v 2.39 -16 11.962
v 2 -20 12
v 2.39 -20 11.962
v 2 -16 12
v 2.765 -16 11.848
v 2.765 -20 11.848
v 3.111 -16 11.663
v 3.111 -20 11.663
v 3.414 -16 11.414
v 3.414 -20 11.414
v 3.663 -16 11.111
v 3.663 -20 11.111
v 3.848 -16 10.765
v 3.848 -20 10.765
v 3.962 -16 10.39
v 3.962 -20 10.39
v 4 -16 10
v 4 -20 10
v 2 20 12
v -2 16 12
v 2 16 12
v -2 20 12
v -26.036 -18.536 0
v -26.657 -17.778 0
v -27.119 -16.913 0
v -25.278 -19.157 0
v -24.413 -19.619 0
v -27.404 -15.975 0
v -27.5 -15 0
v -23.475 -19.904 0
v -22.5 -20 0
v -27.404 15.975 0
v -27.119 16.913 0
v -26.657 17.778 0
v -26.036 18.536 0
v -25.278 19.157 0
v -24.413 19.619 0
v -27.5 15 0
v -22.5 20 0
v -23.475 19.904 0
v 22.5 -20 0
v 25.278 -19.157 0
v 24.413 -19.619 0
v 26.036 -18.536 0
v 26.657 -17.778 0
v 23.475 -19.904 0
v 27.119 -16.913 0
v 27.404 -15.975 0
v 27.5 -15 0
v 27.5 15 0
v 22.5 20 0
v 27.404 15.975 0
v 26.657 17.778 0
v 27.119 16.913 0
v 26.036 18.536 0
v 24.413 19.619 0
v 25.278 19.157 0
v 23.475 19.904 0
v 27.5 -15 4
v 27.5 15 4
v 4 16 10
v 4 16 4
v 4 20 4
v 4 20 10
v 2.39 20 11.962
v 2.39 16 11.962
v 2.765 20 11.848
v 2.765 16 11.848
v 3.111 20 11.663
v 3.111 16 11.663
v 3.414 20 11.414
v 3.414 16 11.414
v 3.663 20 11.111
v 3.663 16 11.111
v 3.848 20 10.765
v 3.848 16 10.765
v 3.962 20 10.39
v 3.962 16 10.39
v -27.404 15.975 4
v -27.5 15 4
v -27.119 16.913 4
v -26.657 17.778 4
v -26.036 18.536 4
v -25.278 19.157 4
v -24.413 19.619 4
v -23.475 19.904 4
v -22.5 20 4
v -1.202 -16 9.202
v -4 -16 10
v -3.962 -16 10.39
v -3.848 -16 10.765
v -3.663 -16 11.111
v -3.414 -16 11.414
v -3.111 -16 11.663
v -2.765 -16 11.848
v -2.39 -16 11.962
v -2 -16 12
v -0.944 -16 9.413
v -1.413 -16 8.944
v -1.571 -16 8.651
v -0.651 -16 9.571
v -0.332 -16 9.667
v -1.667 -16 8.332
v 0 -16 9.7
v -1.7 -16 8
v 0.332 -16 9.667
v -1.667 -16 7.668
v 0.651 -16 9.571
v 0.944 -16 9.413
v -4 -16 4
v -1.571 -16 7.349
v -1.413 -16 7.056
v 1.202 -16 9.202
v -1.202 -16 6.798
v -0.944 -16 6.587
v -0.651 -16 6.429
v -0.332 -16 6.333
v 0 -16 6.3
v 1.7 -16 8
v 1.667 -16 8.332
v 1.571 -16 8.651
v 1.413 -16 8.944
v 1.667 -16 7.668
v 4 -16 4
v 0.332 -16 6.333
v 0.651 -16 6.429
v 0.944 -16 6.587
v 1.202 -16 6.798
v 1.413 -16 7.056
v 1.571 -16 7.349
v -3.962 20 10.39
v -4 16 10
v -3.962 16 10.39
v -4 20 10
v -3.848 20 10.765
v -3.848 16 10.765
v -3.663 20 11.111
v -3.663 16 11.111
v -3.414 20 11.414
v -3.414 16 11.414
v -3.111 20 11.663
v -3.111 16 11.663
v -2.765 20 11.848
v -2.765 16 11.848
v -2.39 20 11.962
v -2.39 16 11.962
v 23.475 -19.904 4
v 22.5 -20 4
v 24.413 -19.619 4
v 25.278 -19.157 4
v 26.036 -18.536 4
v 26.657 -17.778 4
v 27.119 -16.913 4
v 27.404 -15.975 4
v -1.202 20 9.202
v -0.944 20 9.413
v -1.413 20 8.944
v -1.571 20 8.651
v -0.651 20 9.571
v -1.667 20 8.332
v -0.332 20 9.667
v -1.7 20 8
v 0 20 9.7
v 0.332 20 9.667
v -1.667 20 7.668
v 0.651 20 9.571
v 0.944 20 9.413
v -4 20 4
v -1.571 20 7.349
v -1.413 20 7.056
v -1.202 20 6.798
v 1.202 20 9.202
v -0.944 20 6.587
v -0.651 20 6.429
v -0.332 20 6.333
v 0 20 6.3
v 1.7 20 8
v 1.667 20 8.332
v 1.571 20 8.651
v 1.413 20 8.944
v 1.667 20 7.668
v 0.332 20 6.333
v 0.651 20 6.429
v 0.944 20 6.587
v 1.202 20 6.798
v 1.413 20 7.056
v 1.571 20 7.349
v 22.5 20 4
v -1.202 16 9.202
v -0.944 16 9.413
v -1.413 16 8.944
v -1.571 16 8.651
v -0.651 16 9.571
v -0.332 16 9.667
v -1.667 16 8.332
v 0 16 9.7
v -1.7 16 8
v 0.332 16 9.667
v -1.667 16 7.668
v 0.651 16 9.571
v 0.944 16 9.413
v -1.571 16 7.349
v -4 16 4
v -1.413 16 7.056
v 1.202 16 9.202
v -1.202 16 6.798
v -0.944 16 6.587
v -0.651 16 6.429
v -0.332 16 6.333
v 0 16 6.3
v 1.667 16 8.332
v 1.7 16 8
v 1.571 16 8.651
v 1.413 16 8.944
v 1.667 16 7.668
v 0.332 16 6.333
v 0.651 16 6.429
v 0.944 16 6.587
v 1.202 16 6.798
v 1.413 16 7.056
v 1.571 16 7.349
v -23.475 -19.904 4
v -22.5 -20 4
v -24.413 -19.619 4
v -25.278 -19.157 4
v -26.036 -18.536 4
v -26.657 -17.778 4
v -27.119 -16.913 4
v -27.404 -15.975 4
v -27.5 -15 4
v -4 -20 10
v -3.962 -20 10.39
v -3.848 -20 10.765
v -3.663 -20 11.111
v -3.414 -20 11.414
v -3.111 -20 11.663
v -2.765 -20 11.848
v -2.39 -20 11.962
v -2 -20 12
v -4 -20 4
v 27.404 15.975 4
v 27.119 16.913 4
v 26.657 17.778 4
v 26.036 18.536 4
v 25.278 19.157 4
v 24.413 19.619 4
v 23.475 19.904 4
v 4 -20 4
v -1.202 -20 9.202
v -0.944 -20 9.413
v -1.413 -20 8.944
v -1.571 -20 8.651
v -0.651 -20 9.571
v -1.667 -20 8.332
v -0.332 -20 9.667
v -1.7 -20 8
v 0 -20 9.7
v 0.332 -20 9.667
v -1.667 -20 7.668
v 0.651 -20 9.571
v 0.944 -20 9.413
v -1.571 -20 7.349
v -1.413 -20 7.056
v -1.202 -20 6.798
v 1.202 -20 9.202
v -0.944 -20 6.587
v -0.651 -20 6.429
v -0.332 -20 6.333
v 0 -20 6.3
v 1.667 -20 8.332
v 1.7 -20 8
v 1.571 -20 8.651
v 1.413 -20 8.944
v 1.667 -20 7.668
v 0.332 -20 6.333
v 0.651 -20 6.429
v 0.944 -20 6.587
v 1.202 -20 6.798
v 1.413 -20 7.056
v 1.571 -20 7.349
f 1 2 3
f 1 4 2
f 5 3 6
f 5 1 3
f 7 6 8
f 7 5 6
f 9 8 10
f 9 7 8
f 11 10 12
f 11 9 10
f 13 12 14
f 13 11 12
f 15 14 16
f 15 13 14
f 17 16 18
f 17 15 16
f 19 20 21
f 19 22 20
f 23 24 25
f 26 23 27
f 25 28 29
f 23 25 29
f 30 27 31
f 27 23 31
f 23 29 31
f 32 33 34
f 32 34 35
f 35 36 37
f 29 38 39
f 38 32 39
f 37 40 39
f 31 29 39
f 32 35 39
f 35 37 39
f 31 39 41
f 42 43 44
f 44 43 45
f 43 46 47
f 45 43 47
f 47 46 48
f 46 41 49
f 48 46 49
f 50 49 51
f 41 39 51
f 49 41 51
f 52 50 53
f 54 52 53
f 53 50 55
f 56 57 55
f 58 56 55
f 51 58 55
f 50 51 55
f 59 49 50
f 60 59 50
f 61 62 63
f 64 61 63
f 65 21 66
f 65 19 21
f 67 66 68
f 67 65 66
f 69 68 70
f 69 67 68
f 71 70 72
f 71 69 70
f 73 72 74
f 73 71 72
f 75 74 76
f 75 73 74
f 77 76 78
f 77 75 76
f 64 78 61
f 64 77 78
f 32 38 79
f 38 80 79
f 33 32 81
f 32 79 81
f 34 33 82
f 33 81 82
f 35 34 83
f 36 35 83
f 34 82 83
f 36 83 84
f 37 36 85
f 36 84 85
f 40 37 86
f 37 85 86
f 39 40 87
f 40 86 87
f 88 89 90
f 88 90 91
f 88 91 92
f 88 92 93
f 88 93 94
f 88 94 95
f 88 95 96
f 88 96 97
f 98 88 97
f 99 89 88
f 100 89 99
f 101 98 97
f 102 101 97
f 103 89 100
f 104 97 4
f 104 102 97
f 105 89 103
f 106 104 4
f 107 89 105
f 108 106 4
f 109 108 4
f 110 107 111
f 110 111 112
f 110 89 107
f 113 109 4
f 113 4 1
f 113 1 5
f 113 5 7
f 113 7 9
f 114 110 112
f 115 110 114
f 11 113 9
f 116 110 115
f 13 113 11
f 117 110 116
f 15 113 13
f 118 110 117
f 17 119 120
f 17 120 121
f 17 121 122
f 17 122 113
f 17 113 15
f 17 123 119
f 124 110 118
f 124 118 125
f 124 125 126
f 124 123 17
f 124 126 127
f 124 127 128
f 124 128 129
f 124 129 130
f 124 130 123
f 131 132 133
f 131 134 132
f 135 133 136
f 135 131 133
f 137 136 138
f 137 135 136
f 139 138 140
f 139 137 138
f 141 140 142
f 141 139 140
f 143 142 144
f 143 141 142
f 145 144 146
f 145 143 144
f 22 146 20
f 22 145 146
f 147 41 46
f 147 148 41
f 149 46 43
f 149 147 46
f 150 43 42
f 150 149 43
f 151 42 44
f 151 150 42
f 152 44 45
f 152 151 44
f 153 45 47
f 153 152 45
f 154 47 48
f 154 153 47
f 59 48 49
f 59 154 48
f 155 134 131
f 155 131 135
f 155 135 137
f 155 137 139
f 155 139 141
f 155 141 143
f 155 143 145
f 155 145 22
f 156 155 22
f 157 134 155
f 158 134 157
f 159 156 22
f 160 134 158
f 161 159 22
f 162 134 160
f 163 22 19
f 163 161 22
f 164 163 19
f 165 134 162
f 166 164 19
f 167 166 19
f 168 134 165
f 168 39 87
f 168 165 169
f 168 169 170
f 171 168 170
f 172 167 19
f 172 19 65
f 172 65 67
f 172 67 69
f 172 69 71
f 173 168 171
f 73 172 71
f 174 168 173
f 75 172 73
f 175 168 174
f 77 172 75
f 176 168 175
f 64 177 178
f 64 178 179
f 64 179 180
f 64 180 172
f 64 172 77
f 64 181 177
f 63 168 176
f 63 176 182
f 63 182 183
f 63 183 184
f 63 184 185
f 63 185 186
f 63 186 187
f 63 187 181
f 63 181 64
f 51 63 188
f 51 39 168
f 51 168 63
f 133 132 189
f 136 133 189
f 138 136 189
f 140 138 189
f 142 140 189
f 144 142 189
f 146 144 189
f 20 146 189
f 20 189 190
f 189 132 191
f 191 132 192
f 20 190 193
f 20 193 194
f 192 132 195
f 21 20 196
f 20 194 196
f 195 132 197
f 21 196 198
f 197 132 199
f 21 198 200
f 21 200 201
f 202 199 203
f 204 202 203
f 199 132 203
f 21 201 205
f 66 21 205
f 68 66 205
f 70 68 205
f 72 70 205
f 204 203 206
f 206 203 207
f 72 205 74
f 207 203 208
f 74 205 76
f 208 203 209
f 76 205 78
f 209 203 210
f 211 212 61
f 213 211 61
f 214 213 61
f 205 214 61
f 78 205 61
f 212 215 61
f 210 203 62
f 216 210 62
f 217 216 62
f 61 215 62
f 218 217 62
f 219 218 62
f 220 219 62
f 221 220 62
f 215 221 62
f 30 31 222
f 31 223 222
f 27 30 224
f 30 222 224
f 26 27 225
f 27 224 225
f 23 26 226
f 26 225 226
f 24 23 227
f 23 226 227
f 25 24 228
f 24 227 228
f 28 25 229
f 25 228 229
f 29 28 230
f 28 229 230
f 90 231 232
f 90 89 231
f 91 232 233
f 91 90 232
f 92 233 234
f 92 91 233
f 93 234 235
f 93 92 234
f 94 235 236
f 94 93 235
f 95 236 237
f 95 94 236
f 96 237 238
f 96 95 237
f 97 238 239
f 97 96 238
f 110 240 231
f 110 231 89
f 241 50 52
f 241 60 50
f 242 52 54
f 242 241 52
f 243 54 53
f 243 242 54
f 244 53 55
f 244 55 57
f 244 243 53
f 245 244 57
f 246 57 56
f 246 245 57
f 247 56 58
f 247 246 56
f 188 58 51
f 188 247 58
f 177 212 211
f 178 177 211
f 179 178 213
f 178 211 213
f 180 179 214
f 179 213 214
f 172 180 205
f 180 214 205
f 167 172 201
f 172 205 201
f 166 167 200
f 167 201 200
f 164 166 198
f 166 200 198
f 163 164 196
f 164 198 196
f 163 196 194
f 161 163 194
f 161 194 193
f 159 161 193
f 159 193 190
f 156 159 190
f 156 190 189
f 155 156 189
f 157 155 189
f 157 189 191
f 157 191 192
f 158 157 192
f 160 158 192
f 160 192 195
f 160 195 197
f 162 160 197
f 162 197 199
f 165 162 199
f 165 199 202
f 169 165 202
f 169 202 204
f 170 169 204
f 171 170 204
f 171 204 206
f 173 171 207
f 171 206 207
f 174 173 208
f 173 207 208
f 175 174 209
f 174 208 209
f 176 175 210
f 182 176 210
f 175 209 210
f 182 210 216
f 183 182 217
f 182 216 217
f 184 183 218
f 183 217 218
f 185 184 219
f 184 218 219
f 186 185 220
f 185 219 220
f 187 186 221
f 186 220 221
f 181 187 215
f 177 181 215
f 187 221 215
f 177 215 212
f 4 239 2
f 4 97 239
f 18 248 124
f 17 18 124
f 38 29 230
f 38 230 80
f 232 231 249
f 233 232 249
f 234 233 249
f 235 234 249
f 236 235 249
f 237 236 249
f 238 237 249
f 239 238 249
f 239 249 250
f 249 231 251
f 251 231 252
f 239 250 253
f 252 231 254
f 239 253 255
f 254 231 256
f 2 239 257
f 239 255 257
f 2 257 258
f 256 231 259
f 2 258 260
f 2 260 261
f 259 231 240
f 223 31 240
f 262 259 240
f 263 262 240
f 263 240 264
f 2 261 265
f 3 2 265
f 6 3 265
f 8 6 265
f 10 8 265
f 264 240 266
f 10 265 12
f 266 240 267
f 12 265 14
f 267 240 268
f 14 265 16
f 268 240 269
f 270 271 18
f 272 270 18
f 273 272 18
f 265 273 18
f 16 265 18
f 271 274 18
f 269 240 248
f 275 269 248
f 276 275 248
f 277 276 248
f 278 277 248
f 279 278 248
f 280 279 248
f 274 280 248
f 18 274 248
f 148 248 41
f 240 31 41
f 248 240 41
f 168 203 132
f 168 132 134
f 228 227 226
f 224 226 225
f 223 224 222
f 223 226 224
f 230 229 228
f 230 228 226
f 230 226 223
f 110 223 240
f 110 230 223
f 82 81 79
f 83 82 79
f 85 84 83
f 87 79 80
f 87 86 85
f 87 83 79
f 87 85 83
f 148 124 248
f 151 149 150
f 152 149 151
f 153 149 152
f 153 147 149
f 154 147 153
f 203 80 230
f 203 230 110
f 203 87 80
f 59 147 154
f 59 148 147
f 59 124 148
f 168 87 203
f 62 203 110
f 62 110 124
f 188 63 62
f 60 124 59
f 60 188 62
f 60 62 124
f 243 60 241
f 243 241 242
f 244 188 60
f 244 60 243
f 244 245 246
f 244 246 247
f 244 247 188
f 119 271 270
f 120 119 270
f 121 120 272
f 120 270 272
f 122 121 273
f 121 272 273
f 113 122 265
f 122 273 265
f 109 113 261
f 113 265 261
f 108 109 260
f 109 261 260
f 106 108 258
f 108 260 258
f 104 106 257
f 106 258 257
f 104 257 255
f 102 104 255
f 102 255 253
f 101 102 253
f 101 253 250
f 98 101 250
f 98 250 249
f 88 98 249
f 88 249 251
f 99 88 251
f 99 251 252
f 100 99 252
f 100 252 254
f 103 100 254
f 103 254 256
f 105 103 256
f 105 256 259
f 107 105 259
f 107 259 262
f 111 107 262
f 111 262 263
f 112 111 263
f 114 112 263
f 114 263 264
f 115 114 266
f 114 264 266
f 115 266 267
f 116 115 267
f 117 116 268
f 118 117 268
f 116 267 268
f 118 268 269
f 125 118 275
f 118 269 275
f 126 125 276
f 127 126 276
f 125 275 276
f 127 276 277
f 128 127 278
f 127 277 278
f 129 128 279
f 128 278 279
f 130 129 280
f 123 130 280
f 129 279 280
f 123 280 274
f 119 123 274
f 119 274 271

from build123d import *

# Parameters (mm, degrees)
MIRROREDSKETCH_W = 8
MIRROREDSKETCH_H = 4
PAD002_DEPTH     = 8
SKETCH_W         = 55
SKETCH_H         = 40
PAD_DEPTH        = 4
SKETCH001_W      = 8
SKETCH001_H      = 4
PAD001_DEPTH     = 8
SKETCH002_R      = 1.7
POCKET_DEPTH     = 40.001
FILLET_R         = 2
FILLET001_R      = 5


with BuildPart() as pad002:
    # MirroredSketch → Pad002 (new body)
    with BuildSketch(Plane.XY.offset(4)):
        with Locations((0, -18)):
            Rectangle(MIRROREDSKETCH_W, MIRROREDSKETCH_H)
    extrude(amount=PAD002_DEPTH)


with BuildPart() as fillet001:
    # Sketch → Pad (new body)
    with BuildSketch(Plane.XY):
        Rectangle(SKETCH_W, SKETCH_H)
    extrude(amount=PAD_DEPTH)

    # Sketch001 → Pad001 (new body)
    with BuildSketch(Plane.XY.offset(4)):
        with Locations((0, 18)):
            Rectangle(SKETCH001_W, SKETCH001_H)
    extrude(amount=PAD001_DEPTH)

    # Fusion: union Pad002
    add(pad002.part)

    # Sketch002 → Pocket (cut, through all)
    with BuildSketch(Plane.XZ.offset(20)):
        with Locations((0, 8)):
            Circle(SKETCH002_R)
    extrude(amount=-POCKET_DEPTH, mode=Mode.SUBTRACT)

    # Fillet
    fillet_edges = [fillet001.edges().sort_by_distance(p)[0] for p in [
        (4, -18, 12),
        (-4, -18, 12),
        (4, 18, 12),
        (-4, 18, 12),
    ]]
    fillet(fillet_edges, radius=FILLET_R)

    # Fillet001
    fillet001_edges = [fillet001.edges().sort_by_distance(p)[0] for p in [
        (27.5, 20, 2),
        (-27.5, 20, 2),
        (27.5, -20, 2),
        (-27.5, -20, 2),
    ]]
    fillet(fillet001_edges, radius=FILLET001_R)


solid = fillet001.part
